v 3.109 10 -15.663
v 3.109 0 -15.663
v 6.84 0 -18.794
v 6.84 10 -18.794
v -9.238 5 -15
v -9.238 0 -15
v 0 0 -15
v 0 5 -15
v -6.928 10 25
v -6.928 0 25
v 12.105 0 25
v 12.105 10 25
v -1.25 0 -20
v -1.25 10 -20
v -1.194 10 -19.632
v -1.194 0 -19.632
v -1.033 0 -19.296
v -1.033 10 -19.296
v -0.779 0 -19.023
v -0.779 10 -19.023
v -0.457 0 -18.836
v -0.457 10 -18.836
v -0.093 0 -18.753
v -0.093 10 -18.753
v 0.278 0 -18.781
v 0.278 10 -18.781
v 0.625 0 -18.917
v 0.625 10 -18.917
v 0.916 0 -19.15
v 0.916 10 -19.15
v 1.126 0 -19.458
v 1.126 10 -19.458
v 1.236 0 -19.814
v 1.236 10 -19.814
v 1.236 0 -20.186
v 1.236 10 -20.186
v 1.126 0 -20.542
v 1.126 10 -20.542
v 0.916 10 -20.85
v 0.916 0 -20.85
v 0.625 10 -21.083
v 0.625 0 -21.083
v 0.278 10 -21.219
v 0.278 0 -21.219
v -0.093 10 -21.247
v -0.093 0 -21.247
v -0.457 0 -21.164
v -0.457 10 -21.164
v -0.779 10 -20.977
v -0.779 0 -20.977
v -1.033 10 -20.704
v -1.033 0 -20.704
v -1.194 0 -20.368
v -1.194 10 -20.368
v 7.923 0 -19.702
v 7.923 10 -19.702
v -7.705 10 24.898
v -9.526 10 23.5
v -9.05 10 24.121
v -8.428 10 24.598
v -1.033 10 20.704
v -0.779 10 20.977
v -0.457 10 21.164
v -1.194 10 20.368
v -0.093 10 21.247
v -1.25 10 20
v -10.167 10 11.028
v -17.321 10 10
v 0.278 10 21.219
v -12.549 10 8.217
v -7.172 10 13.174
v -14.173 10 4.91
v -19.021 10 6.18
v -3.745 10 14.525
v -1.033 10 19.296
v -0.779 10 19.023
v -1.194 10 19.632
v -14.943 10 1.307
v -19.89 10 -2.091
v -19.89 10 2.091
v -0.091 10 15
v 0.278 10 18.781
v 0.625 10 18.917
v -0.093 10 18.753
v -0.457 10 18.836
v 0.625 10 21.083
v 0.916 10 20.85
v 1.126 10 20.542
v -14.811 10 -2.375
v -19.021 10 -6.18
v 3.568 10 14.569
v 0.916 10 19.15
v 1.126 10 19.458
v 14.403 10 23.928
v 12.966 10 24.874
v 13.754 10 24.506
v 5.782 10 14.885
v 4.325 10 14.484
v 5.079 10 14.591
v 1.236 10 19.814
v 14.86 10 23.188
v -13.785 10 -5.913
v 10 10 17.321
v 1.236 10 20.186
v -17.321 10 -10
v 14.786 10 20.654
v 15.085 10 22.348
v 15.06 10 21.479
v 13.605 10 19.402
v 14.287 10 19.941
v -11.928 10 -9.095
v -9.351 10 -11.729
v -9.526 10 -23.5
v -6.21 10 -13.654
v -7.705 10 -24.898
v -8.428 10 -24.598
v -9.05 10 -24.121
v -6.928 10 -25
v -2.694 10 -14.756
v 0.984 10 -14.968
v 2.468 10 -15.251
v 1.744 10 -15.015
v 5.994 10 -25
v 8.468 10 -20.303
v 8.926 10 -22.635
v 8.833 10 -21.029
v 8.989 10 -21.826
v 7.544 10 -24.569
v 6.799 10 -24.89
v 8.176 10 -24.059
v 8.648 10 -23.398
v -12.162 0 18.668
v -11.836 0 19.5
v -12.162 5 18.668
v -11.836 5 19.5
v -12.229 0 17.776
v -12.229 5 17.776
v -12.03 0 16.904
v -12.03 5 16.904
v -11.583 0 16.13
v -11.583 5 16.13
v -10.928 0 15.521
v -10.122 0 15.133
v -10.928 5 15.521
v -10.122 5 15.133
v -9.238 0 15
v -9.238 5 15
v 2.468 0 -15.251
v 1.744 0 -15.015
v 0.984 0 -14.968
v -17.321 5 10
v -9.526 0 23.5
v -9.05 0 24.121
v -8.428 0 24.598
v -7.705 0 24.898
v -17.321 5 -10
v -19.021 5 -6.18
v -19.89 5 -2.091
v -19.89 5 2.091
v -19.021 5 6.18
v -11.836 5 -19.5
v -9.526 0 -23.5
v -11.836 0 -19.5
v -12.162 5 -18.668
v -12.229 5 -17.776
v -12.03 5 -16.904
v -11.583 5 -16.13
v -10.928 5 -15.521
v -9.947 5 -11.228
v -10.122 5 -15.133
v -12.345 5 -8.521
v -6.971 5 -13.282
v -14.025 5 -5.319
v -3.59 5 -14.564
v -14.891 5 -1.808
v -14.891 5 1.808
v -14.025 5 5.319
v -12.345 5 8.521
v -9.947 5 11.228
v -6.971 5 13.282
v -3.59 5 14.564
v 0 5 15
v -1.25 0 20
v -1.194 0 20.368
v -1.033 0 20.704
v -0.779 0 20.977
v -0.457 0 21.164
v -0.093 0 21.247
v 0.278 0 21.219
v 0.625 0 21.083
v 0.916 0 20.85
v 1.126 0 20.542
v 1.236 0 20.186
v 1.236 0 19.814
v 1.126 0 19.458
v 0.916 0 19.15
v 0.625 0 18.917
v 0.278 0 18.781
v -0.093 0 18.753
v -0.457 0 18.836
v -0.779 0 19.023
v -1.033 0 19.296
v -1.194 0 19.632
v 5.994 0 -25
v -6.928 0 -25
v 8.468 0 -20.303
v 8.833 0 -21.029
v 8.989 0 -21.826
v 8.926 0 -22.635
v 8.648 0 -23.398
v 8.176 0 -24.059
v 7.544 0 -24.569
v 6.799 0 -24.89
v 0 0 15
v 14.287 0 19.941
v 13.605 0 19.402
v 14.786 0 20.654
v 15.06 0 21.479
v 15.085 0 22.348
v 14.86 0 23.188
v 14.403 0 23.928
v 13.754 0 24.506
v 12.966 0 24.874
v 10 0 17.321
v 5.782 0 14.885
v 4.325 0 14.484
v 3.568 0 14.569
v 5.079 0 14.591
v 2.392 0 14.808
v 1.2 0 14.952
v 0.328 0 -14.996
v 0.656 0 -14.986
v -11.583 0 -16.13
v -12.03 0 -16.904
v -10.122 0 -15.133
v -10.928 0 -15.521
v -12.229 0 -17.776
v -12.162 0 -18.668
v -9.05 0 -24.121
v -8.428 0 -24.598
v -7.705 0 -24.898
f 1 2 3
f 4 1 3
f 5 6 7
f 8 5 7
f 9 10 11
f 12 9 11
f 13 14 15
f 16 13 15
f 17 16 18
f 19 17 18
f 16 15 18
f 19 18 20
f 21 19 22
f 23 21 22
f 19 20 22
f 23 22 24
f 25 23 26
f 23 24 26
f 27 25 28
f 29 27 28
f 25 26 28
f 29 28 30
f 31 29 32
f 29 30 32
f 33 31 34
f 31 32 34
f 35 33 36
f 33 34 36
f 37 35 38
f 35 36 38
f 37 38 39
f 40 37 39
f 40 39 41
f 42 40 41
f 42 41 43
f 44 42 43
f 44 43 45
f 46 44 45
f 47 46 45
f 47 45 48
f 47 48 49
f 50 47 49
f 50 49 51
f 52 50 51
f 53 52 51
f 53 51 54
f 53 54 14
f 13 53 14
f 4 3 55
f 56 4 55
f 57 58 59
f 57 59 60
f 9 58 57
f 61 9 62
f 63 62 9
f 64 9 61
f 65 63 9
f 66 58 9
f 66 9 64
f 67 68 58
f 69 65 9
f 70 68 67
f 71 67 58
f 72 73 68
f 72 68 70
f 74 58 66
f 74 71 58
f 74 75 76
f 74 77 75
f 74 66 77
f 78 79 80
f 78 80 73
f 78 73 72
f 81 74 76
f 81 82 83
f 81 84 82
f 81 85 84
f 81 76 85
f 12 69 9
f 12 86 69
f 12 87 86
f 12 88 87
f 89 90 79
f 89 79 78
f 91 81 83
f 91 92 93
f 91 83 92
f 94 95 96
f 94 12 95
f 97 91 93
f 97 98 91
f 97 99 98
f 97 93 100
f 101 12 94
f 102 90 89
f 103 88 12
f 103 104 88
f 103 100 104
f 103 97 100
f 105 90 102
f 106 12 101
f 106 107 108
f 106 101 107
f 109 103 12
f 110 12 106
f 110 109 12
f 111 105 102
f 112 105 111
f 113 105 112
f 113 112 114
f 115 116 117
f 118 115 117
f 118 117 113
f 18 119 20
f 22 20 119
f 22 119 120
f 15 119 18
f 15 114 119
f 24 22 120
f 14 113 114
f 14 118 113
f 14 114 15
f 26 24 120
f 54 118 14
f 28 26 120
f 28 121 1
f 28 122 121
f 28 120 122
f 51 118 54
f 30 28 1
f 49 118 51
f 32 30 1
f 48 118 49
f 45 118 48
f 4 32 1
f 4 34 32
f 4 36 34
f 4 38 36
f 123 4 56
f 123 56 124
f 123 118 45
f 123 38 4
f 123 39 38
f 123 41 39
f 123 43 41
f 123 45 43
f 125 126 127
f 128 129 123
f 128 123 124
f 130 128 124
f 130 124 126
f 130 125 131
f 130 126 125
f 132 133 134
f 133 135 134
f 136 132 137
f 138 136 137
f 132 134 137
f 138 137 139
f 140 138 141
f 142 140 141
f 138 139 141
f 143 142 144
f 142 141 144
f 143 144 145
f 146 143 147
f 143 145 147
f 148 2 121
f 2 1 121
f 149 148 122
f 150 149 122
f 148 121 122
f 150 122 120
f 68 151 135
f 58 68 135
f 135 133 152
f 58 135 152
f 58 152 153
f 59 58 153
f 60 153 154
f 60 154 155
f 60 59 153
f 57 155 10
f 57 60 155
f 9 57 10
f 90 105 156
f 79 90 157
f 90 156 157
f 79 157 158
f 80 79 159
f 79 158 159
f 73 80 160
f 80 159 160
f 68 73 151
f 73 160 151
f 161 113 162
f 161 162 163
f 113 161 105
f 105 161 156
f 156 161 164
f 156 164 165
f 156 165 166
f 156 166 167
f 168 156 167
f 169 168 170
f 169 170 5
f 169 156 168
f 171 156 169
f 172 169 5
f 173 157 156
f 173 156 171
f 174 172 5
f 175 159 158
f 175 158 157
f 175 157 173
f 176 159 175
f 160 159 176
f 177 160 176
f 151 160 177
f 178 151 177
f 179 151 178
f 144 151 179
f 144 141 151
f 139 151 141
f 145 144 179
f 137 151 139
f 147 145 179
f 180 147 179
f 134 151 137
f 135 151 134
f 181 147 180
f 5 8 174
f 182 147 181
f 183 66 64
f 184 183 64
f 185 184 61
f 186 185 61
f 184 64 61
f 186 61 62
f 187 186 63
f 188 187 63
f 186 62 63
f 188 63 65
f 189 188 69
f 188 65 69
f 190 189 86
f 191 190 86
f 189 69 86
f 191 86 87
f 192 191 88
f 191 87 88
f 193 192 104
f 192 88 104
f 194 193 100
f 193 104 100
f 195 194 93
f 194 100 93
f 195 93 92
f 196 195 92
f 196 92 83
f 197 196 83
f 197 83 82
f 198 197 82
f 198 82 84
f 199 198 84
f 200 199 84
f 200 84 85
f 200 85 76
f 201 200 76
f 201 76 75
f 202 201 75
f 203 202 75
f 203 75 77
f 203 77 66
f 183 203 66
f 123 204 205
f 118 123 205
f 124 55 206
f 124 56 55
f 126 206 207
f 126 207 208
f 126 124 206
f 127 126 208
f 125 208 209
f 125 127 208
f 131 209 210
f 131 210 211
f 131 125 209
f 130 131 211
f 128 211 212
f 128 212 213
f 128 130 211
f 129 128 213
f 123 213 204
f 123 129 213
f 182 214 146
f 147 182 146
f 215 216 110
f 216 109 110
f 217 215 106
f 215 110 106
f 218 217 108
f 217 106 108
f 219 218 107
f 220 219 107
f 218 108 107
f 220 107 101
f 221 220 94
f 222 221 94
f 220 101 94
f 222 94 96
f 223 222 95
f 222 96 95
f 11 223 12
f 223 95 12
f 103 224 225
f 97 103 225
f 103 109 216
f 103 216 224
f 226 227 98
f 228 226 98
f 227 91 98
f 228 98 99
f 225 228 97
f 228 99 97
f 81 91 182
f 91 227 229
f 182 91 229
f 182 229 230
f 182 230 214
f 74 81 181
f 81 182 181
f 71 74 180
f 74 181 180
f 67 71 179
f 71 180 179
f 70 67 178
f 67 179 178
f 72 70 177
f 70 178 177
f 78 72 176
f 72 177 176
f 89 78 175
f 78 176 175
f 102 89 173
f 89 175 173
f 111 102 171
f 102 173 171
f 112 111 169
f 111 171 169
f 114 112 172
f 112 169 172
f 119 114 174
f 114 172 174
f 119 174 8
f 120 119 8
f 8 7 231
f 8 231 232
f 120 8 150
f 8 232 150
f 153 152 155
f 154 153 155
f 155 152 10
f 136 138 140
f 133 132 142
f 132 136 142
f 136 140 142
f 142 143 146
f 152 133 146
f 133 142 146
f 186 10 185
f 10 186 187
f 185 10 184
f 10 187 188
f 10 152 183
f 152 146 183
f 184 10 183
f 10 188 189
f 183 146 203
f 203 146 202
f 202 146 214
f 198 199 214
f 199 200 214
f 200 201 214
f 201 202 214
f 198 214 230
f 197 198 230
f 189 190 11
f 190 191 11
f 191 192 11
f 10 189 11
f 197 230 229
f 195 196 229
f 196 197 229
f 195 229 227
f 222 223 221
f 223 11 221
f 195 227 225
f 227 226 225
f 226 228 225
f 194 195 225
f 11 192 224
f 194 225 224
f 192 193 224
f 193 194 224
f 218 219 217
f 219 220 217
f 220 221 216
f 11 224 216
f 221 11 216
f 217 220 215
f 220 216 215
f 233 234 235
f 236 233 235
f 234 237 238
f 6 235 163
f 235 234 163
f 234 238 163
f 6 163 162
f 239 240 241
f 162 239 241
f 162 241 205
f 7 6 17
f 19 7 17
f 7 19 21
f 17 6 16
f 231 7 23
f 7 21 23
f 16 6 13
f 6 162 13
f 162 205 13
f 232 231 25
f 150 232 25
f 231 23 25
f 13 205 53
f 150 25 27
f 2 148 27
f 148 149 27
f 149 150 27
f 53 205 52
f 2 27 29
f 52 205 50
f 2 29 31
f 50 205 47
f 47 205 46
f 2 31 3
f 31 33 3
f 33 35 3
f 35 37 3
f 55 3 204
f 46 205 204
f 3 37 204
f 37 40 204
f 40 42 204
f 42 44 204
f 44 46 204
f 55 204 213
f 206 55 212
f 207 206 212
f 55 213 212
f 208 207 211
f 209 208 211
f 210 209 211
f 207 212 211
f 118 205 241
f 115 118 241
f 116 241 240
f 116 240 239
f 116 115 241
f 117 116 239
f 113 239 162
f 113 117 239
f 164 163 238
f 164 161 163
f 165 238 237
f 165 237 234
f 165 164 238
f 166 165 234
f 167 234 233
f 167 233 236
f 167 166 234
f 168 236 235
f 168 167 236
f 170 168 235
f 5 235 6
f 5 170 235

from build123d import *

# Parameters (mm, degrees)
EXTRUDE_1_DEPTH     = 10
HOLE_WIZARD_M3_1_D  = 2.5
CUT_EXTRUDE_1_DEPTH = 5
FILLET_1_R          = 3


with BuildPart() as part:
    # 草图1 → 凸台-拉伸1 (new body)
    with BuildSketch(Plane(origin=(0, 0, 0), x_dir=(1, 0, 0), z_dir=(0, 1, 0))):
        with BuildLine():
            ThreePointArc((-17.320508076, 10), (-6.840402867, 18.793852416), (6.840402867, 18.793852416))
            Line((6.840402867, 18.793852416), (14.236601546, 25))
            Line((14.236601546, 25), (-8.660254038, 25))
            Line((-8.660254038, 25), (-17.320508076, 10))
        make_face()
        with BuildLine():
            Line((2.136761146, 14.847028383), (6.840402867, 18.793852416))
            ThreePointArc((6.840402867, 18.793852416), (-19.923893962, -1.743114855), (10, -17.320508076))
            Line((10, -17.320508076), (4.682458366, -14.250423982))
            ThreePointArc((4.682458366, -14.250423982), (-14.942920471, -1.307336141), (2.136761146, 14.847028383))
        make_face()
        with BuildLine():
            Line((23.301270189, -25), (10, -17.320508076))
            ThreePointArc((10, -17.320508076), (-5.176380902, -19.318516526), (-17.320508076, -10))
            Line((-17.320508076, -10), (-8.660254038, -25))
            Line((-8.660254038, -25), (23.301270189, -25))
        make_face()
    extrude(amount=EXTRUDE_1_DEPTH)

    # M3 螺纹孔1 (through all)
    with Locations(Plane.XZ):
        with Locations((0, 20), (0, -20)):
            Hole(HOLE_WIZARD_M3_1_D / 2)

    # 草图4 → 切除-拉伸1 (cut)
    with BuildSketch(Plane.XZ):
        with BuildLine():
            Line((0, 15), (-14.43375673, 15))
            Line((-14.43375673, 15), (-17.320508076, 10))
            ThreePointArc((-17.320508076, 10), (-20, 0), (-17.320508076, -10))
            Line((-17.320508076, -10), (-14.43375673, -15))
            Line((-14.43375673, -15), (0, -15))
            Line((0, -15), (0, 15))
        make_face()
    extrude(amount=-CUT_EXTRUDE_1_DEPTH, mode=Mode.SUBTRACT)

    # 圆角1
    fillet_1_edges = [part.edges().sort_by_distance(p)[0] for p in [
        (-8.660254038, 5, -25),
        (14.236601546, 5, -25),
        (2.136761146, 5, -14.847028383),
        (4.682458366, 5, 14.250423982),
        (23.301270189, 5, 25),
        (-8.660254038, 5, 25),
        (-14.43375673, 2.5, -15),
        (-14.43375673, 2.5, 15),
    ]]
    fillet(fillet_1_edges, radius=FILLET_1_R)


solid = part.part
